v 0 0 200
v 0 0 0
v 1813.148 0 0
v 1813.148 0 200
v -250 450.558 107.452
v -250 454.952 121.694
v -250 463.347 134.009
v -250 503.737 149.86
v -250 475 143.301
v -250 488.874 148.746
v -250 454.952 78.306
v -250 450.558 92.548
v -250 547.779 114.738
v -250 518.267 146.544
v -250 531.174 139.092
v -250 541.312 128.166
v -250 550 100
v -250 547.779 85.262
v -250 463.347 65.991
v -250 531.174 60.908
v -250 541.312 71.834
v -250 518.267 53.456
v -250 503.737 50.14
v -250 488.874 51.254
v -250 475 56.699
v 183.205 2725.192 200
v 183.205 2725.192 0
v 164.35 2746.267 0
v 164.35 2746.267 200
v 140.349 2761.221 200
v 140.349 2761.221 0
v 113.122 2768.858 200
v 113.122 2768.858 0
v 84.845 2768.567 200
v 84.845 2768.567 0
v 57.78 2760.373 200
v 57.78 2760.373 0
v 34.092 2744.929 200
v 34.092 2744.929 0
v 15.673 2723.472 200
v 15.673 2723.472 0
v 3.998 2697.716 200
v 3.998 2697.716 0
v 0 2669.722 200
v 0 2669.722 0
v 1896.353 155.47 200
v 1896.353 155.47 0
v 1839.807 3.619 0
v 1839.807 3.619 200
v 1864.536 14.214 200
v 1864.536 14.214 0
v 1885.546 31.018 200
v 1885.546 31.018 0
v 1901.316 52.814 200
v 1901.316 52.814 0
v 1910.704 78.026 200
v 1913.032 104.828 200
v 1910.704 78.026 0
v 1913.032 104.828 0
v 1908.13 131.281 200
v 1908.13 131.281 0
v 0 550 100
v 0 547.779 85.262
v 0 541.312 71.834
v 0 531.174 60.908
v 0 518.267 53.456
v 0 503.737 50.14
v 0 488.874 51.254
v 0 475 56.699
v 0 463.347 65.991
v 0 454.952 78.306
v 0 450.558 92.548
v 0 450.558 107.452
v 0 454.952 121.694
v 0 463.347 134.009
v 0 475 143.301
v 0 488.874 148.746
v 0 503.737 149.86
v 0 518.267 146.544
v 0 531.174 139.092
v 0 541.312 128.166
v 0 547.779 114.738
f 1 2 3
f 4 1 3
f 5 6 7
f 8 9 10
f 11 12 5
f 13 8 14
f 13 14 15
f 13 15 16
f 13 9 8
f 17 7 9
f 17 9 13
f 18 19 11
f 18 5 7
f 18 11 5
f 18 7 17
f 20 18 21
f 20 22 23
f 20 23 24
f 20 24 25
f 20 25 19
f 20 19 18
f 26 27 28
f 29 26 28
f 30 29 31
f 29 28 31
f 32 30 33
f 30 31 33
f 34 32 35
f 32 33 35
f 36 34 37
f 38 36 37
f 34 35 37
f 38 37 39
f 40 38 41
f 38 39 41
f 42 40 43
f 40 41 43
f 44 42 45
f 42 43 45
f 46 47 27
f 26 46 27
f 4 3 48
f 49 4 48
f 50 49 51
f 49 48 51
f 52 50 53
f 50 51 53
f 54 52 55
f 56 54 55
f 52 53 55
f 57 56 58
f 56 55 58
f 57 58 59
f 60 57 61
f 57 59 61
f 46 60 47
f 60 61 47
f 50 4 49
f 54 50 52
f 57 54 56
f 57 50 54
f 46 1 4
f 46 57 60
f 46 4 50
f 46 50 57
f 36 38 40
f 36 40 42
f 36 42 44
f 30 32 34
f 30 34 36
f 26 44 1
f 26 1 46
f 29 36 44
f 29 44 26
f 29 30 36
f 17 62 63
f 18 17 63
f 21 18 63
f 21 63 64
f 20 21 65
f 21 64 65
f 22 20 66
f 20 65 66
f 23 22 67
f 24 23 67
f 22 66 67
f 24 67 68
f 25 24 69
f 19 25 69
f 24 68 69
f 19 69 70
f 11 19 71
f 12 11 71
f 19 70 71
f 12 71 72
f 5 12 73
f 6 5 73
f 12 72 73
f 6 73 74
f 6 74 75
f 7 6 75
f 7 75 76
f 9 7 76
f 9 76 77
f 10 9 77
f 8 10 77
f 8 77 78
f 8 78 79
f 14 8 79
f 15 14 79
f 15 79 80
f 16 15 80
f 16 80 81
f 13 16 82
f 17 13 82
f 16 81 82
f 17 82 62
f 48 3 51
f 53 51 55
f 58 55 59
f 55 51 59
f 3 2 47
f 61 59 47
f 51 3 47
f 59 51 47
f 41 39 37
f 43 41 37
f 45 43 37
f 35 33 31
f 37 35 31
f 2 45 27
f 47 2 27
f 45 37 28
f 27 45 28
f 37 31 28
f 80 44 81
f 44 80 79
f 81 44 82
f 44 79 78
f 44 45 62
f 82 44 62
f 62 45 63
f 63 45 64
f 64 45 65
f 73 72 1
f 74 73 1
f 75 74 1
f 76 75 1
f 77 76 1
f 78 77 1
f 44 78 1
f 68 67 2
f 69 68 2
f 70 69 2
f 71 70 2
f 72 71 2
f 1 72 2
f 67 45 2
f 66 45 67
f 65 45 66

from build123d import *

# Parameters (mm, degrees)
BOSS_EXTRUDE1_DEPTH = 200
SKETCH2_R           = 50
BOSS_EXTRUDE2_DEPTH = 250


with BuildPart() as part:
    # Sketch1 → Boss-Extrude1 (new body)
    with BuildSketch(Plane.XY):
        with BuildLine():
            Line((0, 0), (1813.148290818, 0))
            ThreePointArc((1813.148290818, 0), (1901.315750695, 52.814207447), (1896.353320252, 155.470019623))
            Line((1896.353320252, 155.470019623), (183.205029434, 2725.192455849))
            ThreePointArc((183.205029434, 2725.192455849), (71.021585131, 2765.431638876), (0, 2669.722436227))
            Line((0, 2669.722436227), (0, 0))
        make_face()
    extrude(amount=BOSS_EXTRUDE1_DEPTH)

    # Sketch2 → Boss-Extrude2 (add)
    with BuildSketch(Plane.ZY):
        with Locations(Location((100, 500, 0), (0, 0, 90))):
            Circle(SKETCH2_R)
    extrude(amount=BOSS_EXTRUDE2_DEPTH)


solid = part.part
